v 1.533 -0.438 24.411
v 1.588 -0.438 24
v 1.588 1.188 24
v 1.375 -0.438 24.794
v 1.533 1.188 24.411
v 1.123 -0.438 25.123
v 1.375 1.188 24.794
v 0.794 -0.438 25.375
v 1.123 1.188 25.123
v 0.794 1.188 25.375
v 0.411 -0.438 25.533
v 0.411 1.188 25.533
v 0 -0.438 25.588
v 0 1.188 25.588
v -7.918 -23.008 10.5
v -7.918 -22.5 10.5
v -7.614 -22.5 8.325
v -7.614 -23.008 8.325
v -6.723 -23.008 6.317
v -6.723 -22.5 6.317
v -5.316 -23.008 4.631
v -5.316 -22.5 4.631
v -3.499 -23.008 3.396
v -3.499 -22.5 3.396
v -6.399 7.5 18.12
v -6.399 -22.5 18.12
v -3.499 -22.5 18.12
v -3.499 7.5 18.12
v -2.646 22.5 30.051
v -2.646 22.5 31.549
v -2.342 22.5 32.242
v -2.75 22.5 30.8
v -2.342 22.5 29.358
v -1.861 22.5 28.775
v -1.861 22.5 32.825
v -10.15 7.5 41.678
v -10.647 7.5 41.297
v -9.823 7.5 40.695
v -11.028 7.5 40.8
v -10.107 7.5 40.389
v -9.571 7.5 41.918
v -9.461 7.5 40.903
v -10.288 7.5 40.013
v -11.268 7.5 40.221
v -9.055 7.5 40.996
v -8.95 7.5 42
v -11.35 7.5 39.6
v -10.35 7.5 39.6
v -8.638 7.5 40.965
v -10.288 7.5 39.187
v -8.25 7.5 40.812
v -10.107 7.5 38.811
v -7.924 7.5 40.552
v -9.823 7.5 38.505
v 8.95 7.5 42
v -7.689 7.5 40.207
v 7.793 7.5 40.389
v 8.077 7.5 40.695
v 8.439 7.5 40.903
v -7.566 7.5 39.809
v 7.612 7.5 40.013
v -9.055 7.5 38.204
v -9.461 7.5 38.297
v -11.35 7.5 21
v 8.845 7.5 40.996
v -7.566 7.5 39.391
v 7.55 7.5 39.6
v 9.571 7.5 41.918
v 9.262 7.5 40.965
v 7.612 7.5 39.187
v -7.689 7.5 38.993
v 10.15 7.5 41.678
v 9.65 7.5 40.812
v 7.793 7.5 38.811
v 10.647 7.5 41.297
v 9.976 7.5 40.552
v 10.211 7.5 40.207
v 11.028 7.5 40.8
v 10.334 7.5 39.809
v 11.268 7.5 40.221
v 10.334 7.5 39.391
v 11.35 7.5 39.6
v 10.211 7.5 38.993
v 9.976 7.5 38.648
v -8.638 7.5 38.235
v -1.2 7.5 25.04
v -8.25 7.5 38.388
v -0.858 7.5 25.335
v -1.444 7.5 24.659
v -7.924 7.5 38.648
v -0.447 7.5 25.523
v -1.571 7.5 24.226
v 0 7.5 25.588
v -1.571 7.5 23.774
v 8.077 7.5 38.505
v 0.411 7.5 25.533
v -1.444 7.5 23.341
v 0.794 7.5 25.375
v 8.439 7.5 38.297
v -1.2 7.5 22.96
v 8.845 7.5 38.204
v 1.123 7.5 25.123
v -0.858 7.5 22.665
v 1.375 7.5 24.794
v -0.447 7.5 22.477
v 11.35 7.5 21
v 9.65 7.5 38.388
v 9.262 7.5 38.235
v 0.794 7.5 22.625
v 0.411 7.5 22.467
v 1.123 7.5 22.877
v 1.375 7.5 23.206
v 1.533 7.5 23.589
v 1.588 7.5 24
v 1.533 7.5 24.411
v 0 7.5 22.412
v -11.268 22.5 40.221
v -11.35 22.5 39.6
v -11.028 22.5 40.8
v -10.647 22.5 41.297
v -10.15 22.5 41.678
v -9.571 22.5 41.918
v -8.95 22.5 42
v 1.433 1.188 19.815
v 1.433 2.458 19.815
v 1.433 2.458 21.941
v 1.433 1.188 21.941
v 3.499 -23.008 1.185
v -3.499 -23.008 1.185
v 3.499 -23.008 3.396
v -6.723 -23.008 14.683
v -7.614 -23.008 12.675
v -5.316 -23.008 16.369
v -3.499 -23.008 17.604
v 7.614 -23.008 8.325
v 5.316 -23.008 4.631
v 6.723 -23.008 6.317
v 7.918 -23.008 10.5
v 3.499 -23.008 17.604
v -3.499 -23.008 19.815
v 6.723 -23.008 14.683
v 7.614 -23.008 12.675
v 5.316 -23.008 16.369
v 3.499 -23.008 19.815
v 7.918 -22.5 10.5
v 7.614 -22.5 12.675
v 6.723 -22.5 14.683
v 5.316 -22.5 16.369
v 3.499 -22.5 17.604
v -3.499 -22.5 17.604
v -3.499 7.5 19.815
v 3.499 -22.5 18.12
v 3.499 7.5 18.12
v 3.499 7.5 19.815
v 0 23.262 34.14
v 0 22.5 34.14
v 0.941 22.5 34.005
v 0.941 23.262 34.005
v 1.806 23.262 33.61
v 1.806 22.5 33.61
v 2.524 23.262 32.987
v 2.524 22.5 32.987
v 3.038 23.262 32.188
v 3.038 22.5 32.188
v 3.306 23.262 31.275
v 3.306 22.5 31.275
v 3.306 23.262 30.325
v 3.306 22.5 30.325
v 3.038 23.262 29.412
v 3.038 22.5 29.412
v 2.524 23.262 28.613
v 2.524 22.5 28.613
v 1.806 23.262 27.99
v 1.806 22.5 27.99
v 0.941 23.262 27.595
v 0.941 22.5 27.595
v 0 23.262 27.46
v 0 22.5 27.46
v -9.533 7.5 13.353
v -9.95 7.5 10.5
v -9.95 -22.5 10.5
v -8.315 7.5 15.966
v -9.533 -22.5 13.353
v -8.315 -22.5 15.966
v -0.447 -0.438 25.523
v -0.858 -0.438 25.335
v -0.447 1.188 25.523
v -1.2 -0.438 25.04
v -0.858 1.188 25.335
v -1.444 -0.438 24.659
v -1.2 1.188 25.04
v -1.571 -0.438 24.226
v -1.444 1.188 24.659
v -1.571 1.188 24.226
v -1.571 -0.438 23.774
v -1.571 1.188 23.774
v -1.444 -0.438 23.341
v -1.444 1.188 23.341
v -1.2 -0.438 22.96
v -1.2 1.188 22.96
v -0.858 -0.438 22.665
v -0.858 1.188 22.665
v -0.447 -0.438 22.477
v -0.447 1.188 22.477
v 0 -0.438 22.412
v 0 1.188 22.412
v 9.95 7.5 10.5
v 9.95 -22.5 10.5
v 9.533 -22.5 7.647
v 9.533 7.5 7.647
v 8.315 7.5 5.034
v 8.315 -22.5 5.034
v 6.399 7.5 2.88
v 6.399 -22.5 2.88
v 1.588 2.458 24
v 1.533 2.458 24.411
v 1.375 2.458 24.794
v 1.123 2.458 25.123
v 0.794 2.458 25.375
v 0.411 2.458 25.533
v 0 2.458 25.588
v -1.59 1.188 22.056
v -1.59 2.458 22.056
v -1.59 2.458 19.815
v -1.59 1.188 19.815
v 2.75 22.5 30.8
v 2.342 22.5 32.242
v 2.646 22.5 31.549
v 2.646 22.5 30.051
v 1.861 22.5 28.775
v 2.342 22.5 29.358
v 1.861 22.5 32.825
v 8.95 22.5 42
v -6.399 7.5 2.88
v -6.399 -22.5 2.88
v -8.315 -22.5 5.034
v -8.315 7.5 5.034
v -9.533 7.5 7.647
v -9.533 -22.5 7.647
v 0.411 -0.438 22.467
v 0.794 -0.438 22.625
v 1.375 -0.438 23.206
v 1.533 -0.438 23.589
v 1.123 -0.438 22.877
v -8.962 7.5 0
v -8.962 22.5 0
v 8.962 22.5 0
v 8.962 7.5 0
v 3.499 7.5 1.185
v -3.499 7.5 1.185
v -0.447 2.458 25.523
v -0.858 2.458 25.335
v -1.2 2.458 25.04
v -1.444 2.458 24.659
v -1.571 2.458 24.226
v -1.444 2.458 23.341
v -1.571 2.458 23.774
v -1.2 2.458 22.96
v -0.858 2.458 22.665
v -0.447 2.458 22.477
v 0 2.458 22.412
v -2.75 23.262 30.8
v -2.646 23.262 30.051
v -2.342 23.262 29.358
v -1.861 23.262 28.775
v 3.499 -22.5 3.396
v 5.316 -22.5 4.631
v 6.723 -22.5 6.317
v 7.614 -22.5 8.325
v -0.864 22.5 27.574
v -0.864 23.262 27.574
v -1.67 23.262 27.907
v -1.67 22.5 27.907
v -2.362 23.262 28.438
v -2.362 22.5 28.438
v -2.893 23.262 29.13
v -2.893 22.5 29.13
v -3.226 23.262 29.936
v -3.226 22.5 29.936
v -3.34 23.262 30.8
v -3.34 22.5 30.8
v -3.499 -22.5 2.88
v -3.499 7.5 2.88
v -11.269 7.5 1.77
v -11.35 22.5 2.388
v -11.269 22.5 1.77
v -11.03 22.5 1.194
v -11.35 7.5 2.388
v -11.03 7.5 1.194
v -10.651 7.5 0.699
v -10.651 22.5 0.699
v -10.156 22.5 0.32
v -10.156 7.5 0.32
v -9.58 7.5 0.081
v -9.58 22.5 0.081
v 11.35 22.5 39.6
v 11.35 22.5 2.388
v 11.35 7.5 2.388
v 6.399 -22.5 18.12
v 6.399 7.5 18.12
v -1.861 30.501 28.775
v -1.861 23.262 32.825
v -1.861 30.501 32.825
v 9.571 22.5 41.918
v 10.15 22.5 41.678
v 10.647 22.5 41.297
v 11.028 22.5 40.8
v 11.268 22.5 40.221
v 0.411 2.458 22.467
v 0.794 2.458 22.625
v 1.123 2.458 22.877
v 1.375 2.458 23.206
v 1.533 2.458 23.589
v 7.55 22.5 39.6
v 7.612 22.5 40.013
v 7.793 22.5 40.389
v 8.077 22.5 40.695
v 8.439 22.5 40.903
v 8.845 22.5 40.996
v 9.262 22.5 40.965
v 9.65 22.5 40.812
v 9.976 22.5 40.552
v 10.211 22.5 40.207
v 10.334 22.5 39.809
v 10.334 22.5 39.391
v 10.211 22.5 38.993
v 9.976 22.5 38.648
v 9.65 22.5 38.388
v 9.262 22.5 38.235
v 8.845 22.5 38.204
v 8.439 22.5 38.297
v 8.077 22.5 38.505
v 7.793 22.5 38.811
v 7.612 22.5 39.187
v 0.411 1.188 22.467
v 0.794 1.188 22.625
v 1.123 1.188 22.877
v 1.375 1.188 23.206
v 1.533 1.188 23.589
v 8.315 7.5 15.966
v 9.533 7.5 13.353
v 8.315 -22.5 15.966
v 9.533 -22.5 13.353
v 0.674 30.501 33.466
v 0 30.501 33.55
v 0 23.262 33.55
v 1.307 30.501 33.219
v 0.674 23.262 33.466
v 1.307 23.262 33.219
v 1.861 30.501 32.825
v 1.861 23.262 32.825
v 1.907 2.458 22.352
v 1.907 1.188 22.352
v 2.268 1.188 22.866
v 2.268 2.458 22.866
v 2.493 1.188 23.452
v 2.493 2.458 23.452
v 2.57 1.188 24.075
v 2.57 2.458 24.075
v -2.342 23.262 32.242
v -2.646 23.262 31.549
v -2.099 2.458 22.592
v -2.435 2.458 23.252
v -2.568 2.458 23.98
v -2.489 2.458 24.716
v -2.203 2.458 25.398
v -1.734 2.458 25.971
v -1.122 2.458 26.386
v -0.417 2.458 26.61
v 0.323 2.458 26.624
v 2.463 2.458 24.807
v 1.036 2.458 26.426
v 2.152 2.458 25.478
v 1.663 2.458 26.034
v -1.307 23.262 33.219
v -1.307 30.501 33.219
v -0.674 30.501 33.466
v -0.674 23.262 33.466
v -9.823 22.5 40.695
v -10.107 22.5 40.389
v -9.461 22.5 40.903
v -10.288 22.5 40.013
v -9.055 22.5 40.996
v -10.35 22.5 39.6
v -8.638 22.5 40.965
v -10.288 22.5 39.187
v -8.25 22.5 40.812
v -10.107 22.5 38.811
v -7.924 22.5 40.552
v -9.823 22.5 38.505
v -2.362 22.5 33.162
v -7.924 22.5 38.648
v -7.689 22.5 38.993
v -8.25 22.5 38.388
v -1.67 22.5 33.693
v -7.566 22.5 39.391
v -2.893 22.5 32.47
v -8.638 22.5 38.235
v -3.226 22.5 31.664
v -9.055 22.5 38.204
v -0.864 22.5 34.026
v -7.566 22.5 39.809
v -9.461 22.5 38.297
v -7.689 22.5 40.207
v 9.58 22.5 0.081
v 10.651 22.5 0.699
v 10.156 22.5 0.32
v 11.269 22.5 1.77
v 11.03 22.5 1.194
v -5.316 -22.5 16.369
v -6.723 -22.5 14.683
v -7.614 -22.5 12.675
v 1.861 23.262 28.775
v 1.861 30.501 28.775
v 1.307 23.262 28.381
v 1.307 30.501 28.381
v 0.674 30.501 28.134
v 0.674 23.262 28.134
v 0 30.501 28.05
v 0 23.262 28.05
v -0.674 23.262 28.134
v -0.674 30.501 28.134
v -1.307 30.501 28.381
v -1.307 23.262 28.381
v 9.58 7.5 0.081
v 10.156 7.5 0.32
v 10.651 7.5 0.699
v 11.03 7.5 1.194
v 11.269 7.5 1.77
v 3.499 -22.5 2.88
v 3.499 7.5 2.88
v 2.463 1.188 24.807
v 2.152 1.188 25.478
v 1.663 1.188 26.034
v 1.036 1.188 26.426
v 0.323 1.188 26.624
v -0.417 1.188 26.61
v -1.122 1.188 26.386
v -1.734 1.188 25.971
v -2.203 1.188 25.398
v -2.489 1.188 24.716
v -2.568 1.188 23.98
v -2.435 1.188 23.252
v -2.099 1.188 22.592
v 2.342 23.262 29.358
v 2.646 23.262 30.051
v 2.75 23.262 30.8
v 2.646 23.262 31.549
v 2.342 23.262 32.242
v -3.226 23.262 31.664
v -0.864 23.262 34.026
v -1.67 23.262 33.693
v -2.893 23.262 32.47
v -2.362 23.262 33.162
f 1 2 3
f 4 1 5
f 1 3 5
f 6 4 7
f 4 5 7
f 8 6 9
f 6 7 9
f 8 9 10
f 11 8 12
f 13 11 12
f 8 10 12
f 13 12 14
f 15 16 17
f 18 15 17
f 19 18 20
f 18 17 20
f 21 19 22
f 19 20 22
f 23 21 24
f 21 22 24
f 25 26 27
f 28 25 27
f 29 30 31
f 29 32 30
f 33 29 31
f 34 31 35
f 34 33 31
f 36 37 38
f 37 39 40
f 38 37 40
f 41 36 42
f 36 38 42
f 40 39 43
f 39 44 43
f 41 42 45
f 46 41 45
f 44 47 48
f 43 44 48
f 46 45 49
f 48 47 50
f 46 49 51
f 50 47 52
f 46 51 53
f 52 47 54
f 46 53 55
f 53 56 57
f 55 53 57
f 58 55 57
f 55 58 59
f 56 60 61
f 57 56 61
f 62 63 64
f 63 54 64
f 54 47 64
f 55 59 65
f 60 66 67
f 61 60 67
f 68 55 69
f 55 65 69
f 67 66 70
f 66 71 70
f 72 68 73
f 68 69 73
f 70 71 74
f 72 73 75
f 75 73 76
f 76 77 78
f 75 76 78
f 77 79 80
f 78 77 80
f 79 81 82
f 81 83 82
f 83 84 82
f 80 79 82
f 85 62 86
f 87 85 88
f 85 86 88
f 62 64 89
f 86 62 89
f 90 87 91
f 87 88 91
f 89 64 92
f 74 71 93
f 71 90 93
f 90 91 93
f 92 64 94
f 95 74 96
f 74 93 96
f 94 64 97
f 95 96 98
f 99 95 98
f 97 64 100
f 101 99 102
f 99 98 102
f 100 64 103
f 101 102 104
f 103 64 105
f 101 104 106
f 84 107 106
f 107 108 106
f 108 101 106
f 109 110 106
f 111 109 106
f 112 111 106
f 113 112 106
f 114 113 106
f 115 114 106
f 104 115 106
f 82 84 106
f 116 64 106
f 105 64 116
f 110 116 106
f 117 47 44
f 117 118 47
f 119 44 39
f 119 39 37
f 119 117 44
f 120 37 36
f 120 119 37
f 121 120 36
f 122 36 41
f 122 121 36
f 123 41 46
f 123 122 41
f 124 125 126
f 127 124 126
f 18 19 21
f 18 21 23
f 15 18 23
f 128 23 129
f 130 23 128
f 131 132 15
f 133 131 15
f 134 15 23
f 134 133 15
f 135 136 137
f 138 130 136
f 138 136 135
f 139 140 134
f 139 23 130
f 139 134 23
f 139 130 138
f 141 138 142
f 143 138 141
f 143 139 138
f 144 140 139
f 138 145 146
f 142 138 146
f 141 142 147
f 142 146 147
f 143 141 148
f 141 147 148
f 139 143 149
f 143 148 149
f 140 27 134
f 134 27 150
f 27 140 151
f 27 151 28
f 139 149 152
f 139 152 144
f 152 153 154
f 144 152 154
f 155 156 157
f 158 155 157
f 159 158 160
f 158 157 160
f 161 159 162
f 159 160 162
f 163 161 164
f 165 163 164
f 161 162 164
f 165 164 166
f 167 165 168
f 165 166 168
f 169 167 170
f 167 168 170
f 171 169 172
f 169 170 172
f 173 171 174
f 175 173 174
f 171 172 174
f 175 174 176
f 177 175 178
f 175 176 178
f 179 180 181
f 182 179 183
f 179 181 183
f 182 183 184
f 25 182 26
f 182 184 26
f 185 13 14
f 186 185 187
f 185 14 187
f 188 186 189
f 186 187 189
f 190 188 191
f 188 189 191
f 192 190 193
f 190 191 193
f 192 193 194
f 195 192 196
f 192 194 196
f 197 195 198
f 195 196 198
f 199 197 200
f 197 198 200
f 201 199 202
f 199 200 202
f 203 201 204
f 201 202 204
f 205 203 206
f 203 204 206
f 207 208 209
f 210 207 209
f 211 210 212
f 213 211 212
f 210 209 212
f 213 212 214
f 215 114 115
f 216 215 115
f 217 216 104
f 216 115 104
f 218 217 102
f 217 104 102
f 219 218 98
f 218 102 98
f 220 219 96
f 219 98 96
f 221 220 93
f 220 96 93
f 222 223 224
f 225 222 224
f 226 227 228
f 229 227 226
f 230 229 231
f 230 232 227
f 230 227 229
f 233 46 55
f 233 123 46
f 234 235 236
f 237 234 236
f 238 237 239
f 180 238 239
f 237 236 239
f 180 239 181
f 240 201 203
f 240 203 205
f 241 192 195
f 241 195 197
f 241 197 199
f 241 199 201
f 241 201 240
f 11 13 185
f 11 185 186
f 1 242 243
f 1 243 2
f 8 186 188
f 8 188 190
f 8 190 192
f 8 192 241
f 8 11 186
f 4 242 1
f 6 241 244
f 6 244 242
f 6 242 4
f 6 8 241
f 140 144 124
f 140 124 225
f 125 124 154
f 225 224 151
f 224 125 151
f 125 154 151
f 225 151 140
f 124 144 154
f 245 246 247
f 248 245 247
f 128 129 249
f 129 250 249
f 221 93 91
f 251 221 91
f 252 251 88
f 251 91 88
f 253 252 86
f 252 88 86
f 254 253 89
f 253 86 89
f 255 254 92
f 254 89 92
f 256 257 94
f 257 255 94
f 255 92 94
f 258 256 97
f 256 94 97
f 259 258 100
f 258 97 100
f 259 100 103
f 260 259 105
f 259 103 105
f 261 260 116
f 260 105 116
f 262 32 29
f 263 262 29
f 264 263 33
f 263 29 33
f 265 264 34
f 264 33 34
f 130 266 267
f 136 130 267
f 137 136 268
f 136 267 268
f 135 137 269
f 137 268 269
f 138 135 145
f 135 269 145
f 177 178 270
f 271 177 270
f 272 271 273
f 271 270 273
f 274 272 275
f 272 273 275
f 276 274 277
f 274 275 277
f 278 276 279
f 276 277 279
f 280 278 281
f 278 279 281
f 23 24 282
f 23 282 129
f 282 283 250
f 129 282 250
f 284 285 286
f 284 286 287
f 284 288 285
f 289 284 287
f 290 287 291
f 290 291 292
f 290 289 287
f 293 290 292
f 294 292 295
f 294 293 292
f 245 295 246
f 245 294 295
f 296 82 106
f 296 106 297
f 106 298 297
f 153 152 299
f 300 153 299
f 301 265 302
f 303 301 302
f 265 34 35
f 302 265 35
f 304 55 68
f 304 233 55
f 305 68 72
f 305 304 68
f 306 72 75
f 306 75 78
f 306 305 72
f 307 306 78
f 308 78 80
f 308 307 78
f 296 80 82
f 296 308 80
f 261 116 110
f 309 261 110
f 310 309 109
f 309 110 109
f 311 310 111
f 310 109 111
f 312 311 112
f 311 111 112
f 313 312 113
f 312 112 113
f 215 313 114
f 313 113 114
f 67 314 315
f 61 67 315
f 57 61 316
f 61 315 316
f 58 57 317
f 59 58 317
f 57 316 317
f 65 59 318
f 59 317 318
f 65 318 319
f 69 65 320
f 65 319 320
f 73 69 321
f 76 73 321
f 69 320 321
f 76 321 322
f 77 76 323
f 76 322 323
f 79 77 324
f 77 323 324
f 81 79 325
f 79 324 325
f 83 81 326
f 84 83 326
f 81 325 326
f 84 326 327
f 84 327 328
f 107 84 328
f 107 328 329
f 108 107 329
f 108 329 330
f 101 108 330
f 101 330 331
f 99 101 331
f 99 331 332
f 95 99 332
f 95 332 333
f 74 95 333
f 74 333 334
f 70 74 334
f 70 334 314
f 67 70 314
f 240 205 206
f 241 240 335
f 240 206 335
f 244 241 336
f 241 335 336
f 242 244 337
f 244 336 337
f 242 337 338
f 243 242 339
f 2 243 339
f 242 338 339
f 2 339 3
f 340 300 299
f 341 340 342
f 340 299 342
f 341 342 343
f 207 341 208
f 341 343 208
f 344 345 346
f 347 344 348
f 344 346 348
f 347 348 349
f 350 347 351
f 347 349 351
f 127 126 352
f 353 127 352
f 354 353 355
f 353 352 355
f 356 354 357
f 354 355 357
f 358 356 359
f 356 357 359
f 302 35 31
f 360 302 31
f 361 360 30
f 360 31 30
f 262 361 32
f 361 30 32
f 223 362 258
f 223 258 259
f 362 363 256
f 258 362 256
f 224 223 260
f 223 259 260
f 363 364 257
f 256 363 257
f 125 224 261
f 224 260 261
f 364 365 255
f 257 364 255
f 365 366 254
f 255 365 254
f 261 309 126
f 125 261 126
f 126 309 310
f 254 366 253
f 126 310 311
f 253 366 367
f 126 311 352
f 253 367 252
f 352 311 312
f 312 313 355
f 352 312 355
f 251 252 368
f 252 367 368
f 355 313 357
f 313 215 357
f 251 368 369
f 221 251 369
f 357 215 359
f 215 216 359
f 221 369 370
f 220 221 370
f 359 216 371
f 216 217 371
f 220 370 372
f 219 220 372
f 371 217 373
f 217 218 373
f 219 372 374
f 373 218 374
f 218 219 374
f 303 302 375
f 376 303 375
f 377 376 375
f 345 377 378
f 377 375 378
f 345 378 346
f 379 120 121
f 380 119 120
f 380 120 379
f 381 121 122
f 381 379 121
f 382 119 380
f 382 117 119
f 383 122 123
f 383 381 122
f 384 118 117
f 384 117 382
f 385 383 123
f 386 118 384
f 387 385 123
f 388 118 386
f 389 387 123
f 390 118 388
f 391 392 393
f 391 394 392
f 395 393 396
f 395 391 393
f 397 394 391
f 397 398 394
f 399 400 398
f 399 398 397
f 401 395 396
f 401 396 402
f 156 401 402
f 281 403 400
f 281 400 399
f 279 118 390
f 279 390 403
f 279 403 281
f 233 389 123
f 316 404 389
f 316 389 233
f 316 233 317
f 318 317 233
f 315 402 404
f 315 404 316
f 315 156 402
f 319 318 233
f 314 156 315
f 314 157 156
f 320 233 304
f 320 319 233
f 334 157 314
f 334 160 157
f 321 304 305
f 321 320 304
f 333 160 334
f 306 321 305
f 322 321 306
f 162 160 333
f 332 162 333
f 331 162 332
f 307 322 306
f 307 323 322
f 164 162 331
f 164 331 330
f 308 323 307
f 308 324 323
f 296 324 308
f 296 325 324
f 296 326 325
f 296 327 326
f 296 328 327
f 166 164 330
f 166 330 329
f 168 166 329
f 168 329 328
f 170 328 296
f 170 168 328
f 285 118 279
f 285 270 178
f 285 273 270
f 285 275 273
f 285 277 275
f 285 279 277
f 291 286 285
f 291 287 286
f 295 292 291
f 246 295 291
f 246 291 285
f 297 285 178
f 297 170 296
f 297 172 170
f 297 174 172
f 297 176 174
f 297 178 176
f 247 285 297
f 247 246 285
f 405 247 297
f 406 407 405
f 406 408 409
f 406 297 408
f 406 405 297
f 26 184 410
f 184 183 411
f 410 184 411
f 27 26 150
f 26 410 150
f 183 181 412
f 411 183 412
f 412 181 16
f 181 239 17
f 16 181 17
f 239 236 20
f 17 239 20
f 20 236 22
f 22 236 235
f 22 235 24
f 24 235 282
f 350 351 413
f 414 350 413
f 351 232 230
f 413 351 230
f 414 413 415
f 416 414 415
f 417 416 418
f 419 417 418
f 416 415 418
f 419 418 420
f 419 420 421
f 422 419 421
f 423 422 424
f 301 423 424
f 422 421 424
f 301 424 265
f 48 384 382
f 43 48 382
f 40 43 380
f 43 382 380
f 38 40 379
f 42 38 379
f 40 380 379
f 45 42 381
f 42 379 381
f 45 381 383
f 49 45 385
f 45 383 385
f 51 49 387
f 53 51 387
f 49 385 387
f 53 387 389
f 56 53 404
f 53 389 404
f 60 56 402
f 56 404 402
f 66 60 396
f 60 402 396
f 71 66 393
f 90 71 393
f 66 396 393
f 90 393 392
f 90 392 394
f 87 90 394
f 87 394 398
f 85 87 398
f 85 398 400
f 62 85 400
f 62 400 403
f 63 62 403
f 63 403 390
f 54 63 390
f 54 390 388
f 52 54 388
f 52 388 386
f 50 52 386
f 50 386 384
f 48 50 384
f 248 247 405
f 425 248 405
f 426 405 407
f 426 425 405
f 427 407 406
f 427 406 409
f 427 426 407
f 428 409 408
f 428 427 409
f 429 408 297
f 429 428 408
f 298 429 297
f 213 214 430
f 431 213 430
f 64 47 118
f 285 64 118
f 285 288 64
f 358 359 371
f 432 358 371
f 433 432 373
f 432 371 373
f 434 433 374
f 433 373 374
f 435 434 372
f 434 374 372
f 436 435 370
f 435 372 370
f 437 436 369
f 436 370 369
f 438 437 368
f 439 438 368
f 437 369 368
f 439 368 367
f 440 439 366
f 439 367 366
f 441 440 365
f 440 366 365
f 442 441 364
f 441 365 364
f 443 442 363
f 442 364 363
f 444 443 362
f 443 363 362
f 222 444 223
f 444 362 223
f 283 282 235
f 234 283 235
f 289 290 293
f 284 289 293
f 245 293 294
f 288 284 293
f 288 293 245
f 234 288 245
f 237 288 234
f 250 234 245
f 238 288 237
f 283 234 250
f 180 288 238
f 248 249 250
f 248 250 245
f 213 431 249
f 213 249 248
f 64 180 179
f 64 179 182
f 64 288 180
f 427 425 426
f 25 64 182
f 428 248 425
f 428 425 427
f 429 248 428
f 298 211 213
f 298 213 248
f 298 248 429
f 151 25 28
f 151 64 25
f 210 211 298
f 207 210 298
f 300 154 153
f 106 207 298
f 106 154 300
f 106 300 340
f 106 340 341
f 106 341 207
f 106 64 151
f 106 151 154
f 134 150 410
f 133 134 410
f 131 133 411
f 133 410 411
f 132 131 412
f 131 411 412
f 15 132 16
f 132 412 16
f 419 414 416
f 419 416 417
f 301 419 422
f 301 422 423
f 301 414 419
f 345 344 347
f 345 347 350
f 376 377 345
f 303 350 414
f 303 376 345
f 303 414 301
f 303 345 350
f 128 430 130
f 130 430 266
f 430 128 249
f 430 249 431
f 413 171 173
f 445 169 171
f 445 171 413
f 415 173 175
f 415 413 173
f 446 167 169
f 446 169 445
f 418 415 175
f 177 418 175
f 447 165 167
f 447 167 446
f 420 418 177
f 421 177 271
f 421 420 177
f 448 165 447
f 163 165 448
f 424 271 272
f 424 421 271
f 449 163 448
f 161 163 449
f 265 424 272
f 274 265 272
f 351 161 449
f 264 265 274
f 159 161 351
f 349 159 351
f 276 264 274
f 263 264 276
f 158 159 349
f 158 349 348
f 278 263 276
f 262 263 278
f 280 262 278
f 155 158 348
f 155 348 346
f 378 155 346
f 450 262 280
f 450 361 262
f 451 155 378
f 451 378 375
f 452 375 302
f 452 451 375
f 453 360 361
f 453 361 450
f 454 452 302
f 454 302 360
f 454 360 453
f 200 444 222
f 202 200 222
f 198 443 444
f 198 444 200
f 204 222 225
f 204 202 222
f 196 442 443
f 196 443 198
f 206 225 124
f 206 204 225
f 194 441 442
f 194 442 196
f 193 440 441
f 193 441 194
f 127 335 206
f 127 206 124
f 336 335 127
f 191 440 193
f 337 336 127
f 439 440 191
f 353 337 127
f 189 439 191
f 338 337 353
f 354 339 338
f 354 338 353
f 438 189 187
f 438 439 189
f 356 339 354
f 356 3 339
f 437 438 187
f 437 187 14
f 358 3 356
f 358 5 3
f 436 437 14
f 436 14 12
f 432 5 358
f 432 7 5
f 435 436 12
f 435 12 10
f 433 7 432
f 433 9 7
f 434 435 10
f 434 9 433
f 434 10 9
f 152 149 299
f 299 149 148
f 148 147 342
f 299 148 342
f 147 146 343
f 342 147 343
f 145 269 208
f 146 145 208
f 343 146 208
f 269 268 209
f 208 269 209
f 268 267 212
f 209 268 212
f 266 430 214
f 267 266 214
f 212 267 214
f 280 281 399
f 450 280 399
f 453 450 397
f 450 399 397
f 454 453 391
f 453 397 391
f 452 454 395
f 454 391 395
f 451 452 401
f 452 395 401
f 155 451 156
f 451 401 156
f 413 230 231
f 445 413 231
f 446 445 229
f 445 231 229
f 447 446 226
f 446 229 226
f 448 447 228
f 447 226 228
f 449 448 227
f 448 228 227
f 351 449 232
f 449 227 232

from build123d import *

# Parameters (mm, degrees)
F0_W      = 22.7
F0_H      = 15
F1_DEPTH  = 42
F0_H_2    = 30
F2_DEPTH  = 21
F4_DEPTH  = 7.9375
F5_R      = 2.4
F8_DEPTH  = 29.99994
F11_DEPTH = 1.27
F12_R     = 2.3876
F13_DEPTH = 8.001
F14_DEPTH = 0.762
F6_R      = 1.4
F15_DEPTH = 25.4
F16_DEPTH = 0.508


# Not quite as in the source:
# - a length typed as a fraction of an inch, garbled in the dataset ("3 / 203.2 mm" for 3/8 in), is restored


with BuildPart() as f1:
    # F0 (on Top) → F1 (new body)
    with BuildSketch(Plane.XY):
        with Locations((0, 15)):
            Rectangle(F0_W, F0_H)
    extrude(amount=F1_DEPTH)

    # F0 (on Top) → F2 (join)
    with BuildSketch(Plane.XY):
        with Locations((0, 15)):
            Rectangle(F0_W, F0_H)
        with Locations((0, -7.5)):
            Rectangle(F0_W, F0_H_2)
    extrude(amount=F2_DEPTH)

    # F3 (on face) → F4 (join)
    with BuildSketch(Plane.XZ.offset(-7.5)):
        with BuildLine():
            Line((0, 25.5875), (0, 22.4125))
            ThreePointArc((0, 22.4125), (1.1225320151, 22.8774679849), (1.5875, 24))
            ThreePointArc((1.5875, 24), (1.1225320151, 25.1225320151), (0, 25.5875))
        make_face()
        with BuildLine():
            ThreePointArc((0, 25.5875), (-1.5875, 24), (0, 22.4125))
            Line((0, 22.4125), (0, 25.5875))
        make_face()
    extrude(amount=F4_DEPTH)

    # F5
    f5_edges = [f1.edges().sort_by_distance(p)[0] for p in [
        (-11.35, 15, 42),
        (11.35, 15, 42),
    ]]
    fillet(f5_edges, radius=F5_R)

    # F7 (on face) → F8 (cut)
    with BuildSketch(Plane.XZ.offset(22.5)):
        with BuildLine():
            Line((11.35, 21), (0, 21))
            Line((0, 21), (0, 20.45045))
            ThreePointArc((0, 20.45045), (1.7780416897, 20.2903024954), (3.49885, 19.8150149694))
            ThreePointArc((3.49885, 19.8150149694), (5.0209631758, 19.0907731893), (6.3989886078, 18.12))
            ThreePointArc((6.3989886078, 18.12), (9.0189875095, 14.7034889681), (9.95045, 10.5))
            Line((9.95045, 10.5), (11.35, 10.5))
            Line((11.35, 10.5), (11.35, 21))
        make_face()
        with BuildLine():
            Line((0, 20.45045), (0, 21))
            Line((0, 21), (-11.35, 21))
            Line((-11.35, 21), (-11.35, 10.5))
            Line((-11.35, 10.5), (-9.95045, 10.5))
            ThreePointArc((-9.95045, 10.5), (-9.0189875095, 14.7034889681), (-6.3989886078, 18.12))
            ThreePointArc((-6.3989886078, 18.12), (-5.0209631758, 19.0907731893), (-3.49885, 19.8150149694))
            ThreePointArc((-3.49885, 19.8150149694), (-1.7780416897, 20.2903024954), (0, 20.45045))
        make_face()
        with BuildLine():
            Line((-3.49885, 18.12), (-3.49885, 19.8150149694))
            ThreePointArc((-3.49885, 19.8150149694), (-5.0209631758, 19.0907731893), (-6.3989886078, 18.12))
            Line((-6.3989886078, 18.12), (-3.49885, 18.12))
        make_face()
        with BuildLine():
            ThreePointArc((6.3989886078, 18.12), (5.0209631758, 19.0907731893), (3.49885, 19.8150149694))
            Line((3.49885, 19.8150149694), (3.49885, 18.12))
            Line((3.49885, 18.12), (6.3989886078, 18.12))
        make_face()
        with BuildLine():
            Line((-9.95045, 10.5), (-11.35, 10.5))
            Line((-11.35, 10.5), (-11.35, 0))
            Line((-11.35, 0), (0, 0))
            Line((0, 0), (0, 0.54955))
            ThreePointArc((0, 0.54955), (-1.7780416897, 0.7096975046), (-3.49885, 1.1849850306))
            ThreePointArc((-3.49885, 1.1849850306), (-5.0209631758, 1.9092268107), (-6.3989886078, 2.88))
            ThreePointArc((-6.3989886078, 2.88), (-9.0189875095, 6.2965110319), (-9.95045, 10.5))
        make_face()
        with BuildLine():
            Line((11.35, 0), (11.35, 10.5))
            Line((11.35, 10.5), (9.95045, 10.5))
            ThreePointArc((9.95045, 10.5), (9.0189875095, 6.2965110319), (6.3989886078, 2.88))
            ThreePointArc((6.3989886078, 2.88), (5.0209631758, 1.9092268107), (3.49885, 1.1849850306))
            ThreePointArc((3.49885, 1.1849850306), (1.7780416897, 0.7096975046), (0, 0.54955))
            Line((0, 0.54955), (0, 0))
            Line((0, 0), (11.35, 0))
        make_face()
        with BuildLine():
            ThreePointArc((3.49885, 1.1849850306), (5.0209631758, 1.9092268107), (6.3989886078, 2.88))
            Line((6.3989886078, 2.88), (3.49885, 2.88))
            Line((3.49885, 2.88), (3.49885, 1.1849850306))
        make_face()
        with BuildLine():
            Line((-3.49885, 2.88), (-6.3989886078, 2.88))
            ThreePointArc((-6.3989886078, 2.88), (-5.0209631758, 1.9092268107), (-3.49885, 1.1849850306))
            Line((-3.49885, 1.1849850306), (-3.49885, 2.88))
        make_face()
        with BuildLine():
            ThreePointArc((3.49885, 19.8150149694), (1.7780416897, 20.2903024954), (0, 20.45045))
            Line((0, 20.45045), (0, 19.8150149694))
            Line((0, 19.8150149694), (3.49885, 19.8150149694))
        make_face()
        with BuildLine():
            Line((0, 19.8150149694), (0, 20.45045))
            ThreePointArc((0, 20.45045), (-1.7780416897, 20.2903024954), (-3.49885, 19.8150149694))
            Line((-3.49885, 19.8150149694), (0, 19.8150149694))
        make_face()
        with BuildLine():
            ThreePointArc((0, 0.54955), (1.7780416897, 0.7096975046), (3.49885, 1.1849850306))
            Line((3.49885, 1.1849850306), (0, 1.1849850306))
            Line((0, 1.1849850306), (0, 0.54955))
        make_face()
        with BuildLine():
            ThreePointArc((-3.49885, 1.1849850306), (-1.7780416897, 0.7096975046), (0, 0.54955))
            Line((0, 0.54955), (0, 1.1849850306))
            Line((0, 1.1849850306), (-3.49885, 1.1849850306))
        make_face()
    extrude(amount=-F8_DEPTH, mode=Mode.SUBTRACT)

    # F10 (on offset) → F11 (join)
    with BuildSketch(Plane.XZ.offset(-2.4581)):
        with BuildLine():
            ThreePointArc((1.4326738892, 21.9412771473), (2.2677347419, 22.8658808954), (2.5697519674, 24.0746010095))
            ThreePointArc((2.5697519674, 24.0746010095), (-1.1220643914, 26.3864393852), (-1.5898686834, 22.0557045923))
            Line((-1.5898686834, 22.0557045923), (-1.5898686834, 23.8072182983))
            Line((-1.5898686834, 23.8072182983), (1.4326738892, 23.8072182983))
            Line((1.4326738892, 23.8072182983), (1.4326738892, 21.9412771473))
        make_face()
        with BuildLine():
            Line((-1.5898686834, 23.8072182983), (-1.5898686834, 22.0557045923))
            ThreePointArc((-1.5898686834, 22.0557045923), (-0.0972160525, 21.5066885864), (1.4326738892, 21.9412771473))
            Line((1.4326738892, 21.9412771473), (1.4326738892, 23.8072182983))
            Line((1.4326738892, 23.8072182983), (-1.5898686834, 23.8072182983))
        make_face()
        with BuildLine():
            ThreePointArc((1.4326738892, 21.9412771473), (-0.0972160525, 21.5066885864), (-1.5898686834, 22.0557045923))
            Line((-1.5898686834, 22.0557045923), (-1.5898686834, 19.2958321422))
            Line((-1.5898686834, 19.2958321422), (1.4326738892, 19.2958321422))
            Line((1.4326738892, 19.2958321422), (1.4326738892, 21.9412771473))
        make_face()
    extrude(amount=F11_DEPTH)

    # F12
    f12_edges = [f1.edges().sort_by_distance(p)[0] for p in [
        (11.35, 14.99997, 0),
        (-11.35, 14.99997, 0),
    ]]
    fillet(f12_edges, radius=F12_R)

    # F6 (on face) → F13 (join)
    with BuildSketch(Plane(origin=(0, 22.5, 0), x_dir=(-1, 0, 0), z_dir=(0, 1, 0))):
        with BuildLine():
            ThreePointArc((1.86055, 32.8250564677), (0.9983973943, 33.3623627072), (0, 33.55))
            Line((0, 33.55), (0, 28.05))
            ThreePointArc((0, 28.05), (0.9983973943, 28.2376372928), (1.86055, 28.7749435323))
            Line((1.86055, 28.7749435323), (1.86055, 32.8250564677))
        make_face()
        with BuildLine():
            Line((0, 28.05), (0, 33.55))
            ThreePointArc((0, 33.55), (-0.9983973943, 33.3623627072), (-1.86055, 32.8250564677))
            Line((-1.86055, 32.8250564677), (-1.86055, 28.7749435323))
            ThreePointArc((-1.86055, 28.7749435323), (-0.9983973943, 28.2376372928), (0, 28.05))
        make_face()
    extrude(amount=F13_DEPTH)

    # F6 (on face) → F14 (join)
    with BuildSketch(Plane(origin=(0, 22.5, 0), x_dir=(-1, 0, 0), z_dir=(0, 1, 0))):
        with BuildLine():
            ThreePointArc((3.3400836906, 30.8), (2.3617958273, 33.1617958273), (0, 34.1400836906))
            Line((0, 34.1400836906), (0, 33.55))
            ThreePointArc((0, 33.55), (0.9983973943, 33.3623627072), (1.86055, 32.8250564677))
            ThreePointArc((1.86055, 32.8250564677), (2.5178376139, 31.9058904783), (2.75, 30.8))
            ThreePointArc((2.75, 30.8), (2.5178376139, 29.6941095217), (1.86055, 28.7749435323))
            ThreePointArc((1.86055, 28.7749435323), (0.9983973943, 28.2376372928), (0, 28.05))
            Line((0, 28.05), (0, 27.4599163094))
            ThreePointArc((0, 27.4599163094), (2.3617958273, 28.4382041727), (3.3400836906, 30.8))
        make_face()
        with BuildLine():
            Line((0, 33.55), (0, 34.1400836906))
            ThreePointArc((0, 34.1400836906), (-3.3400836906, 30.8), (0, 27.4599163094))
            Line((0, 27.4599163094), (0, 28.05))
            ThreePointArc((0, 28.05), (-0.9983973943, 28.2376372928), (-1.86055, 28.7749435323))
            ThreePointArc((-1.86055, 28.7749435323), (-2.75, 30.8), (-1.86055, 32.8250564677))
            ThreePointArc((-1.86055, 32.8250564677), (-0.9983973943, 33.3623627072), (0, 33.55))
        make_face()
    extrude(amount=F14_DEPTH)

    # F6 (on face) → F15 (cut)
    with BuildSketch(Plane(origin=(0, 22.5, 0), x_dir=(-1, 0, 0), z_dir=(0, 1, 0))):
        with Locations((-8.95, 39.6)):
            Circle(F6_R)
        with Locations((8.95, 39.6)):
            Circle(F6_R)
    extrude(amount=-F15_DEPTH, mode=Mode.SUBTRACT)

    # F7 (on face) → F16 (join)
    with BuildSketch(Plane.XZ.offset(22.5)):
        with BuildLine():
            ThreePointArc((7.91845, 10.5), (6.7233666859, 14.6830838875), (3.49885, 17.6035131505))
            Line((3.49885, 17.6035131505), (3.49885, 10.5))
            Line((3.49885, 10.5), (7.91845, 10.5))
        make_face()
        with BuildLine():
            Line((2.1534740311, 18.12), (0, 18.12))
            Line((0, 18.12), (0, 10.5))
            Line((0, 10.5), (3.49885, 10.5))
            Line((3.49885, 10.5), (3.49885, 17.6035131505))
            ThreePointArc((3.49885, 17.6035131505), (2.8379361171, 17.8924264621), (2.1534740311, 18.12))
        make_face()
        with BuildLine():
            Line((0, 10.5), (0, 18.12))
            Line((0, 18.12), (-2.1534740311, 18.12))
            ThreePointArc((-2.1534740311, 18.12), (-2.8379361171, 17.8924264621), (-3.49885, 17.6035131505))
            Line((-3.49885, 17.6035131505), (-3.49885, 10.5))
            Line((-3.49885, 10.5), (0, 10.5))
        make_face()
        with BuildLine():
            Line((-3.49885, 10.5), (-3.49885, 17.6035131505))
            ThreePointArc((-3.49885, 17.6035131505), (-6.7233666859, 14.6830838875), (-7.91845, 10.5))
            Line((-7.91845, 10.5), (-3.49885, 10.5))
        make_face()
        with BuildLine():
            Line((-3.49885, 10.5), (-7.91845, 10.5))
            ThreePointArc((-7.91845, 10.5), (-6.7233666859, 6.3169161125), (-3.49885, 3.3964868495))
            Line((-3.49885, 3.3964868495), (-3.49885, 10.5))
        make_face()
        with BuildLine():
            Line((0, 2.88), (0, 10.5))
            Line((0, 10.5), (-3.49885, 10.5))
            Line((-3.49885, 10.5), (-3.49885, 3.3964868495))
            ThreePointArc((-3.49885, 3.3964868495), (-2.8379361171, 3.1075735379), (-2.1534740311, 2.88))
            Line((-2.1534740311, 2.88), (0, 2.88))
        make_face()
        with BuildLine():
            Line((3.49885, 10.5), (0, 10.5))
            Line((0, 10.5), (0, 2.88))
            Line((0, 2.88), (2.1534740311, 2.88))
            ThreePointArc((2.1534740311, 2.88), (2.8379361171, 3.1075735379), (3.49885, 3.3964868495))
            Line((3.49885, 3.3964868495), (3.49885, 10.5))
        make_face()
        with BuildLine():
            ThreePointArc((3.49885, 3.3964868495), (6.7233666859, 6.3169161125), (7.91845, 10.5))
            Line((7.91845, 10.5), (3.49885, 10.5))
            Line((3.49885, 10.5), (3.49885, 3.3964868495))
        make_face()
        with BuildLine():
            ThreePointArc((2.1534740311, 18.12), (1.0870283811, 18.3434826258), (0, 18.41845))
            Line((0, 18.41845), (0, 18.12))
            Line((0, 18.12), (2.1534740311, 18.12))
        make_face()
        with BuildLine():
            Line((0, 18.12), (0, 18.41845))
            ThreePointArc((0, 18.41845), (-1.0870283811, 18.3434826258), (-2.1534740311, 18.12))
            Line((-2.1534740311, 18.12), (0, 18.12))
        make_face()
        with BuildLine():
            Line((2.1534740311, 2.88), (0, 2.88))
            Line((0, 2.88), (0, 2.58155))
            ThreePointArc((0, 2.58155), (1.0870283811, 2.6565173742), (2.1534740311, 2.88))
        make_face()
        with BuildLine():
            Line((0, 2.58155), (0, 2.88))
            Line((0, 2.88), (-2.1534740311, 2.88))
            ThreePointArc((-2.1534740311, 2.88), (-1.0870283811, 2.6565173742), (0, 2.58155))
        make_face()
        with BuildLine():
            Line((3.49885, 19.8150149694), (0, 19.8150149694))
            Line((0, 19.8150149694), (0, 18.41845))
            ThreePointArc((0, 18.41845), (1.0870283811, 18.3434826258), (2.1534740311, 18.12))
            Line((2.1534740311, 18.12), (3.49885, 18.12))
            Line((3.49885, 18.12), (3.49885, 19.8150149694))
        make_face()
        with BuildLine():
            Line((0, 18.41845), (0, 19.8150149694))
            Line((0, 19.8150149694), (-3.49885, 19.8150149694))
            Line((-3.49885, 19.8150149694), (-3.49885, 18.12))
            Line((-3.49885, 18.12), (-2.1534740311, 18.12))
            ThreePointArc((-2.1534740311, 18.12), (-1.0870283811, 18.3434826258), (0, 18.41845))
        make_face()
        with BuildLine():
            Line((-2.1534740311, 18.12), (-3.49885, 18.12))
            Line((-3.49885, 18.12), (-3.49885, 17.6035131505))
            ThreePointArc((-3.49885, 17.6035131505), (-2.8379361171, 17.8924264621), (-2.1534740311, 18.12))
        make_face()
        with BuildLine():
            Line((3.49885, 17.6035131505), (3.49885, 18.12))
            Line((3.49885, 18.12), (2.1534740311, 18.12))
            ThreePointArc((2.1534740311, 18.12), (2.8379361171, 17.8924264621), (3.49885, 17.6035131505))
        make_face()
        with BuildLine():
            Line((0, 1.1849850306), (3.49885, 1.1849850306))
            Line((3.49885, 1.1849850306), (3.49885, 2.88))
            Line((3.49885, 2.88), (2.1534740311, 2.88))
            ThreePointArc((2.1534740311, 2.88), (1.0870283811, 2.6565173742), (0, 2.58155))
            Line((0, 2.58155), (0, 1.1849850306))
        make_face()
        with BuildLine():
            Line((-3.49885, 2.88), (-3.49885, 1.1849850306))
            Line((-3.49885, 1.1849850306), (0, 1.1849850306))
            Line((0, 1.1849850306), (0, 2.58155))
            ThreePointArc((0, 2.58155), (-1.0870283811, 2.6565173742), (-2.1534740311, 2.88))
            Line((-2.1534740311, 2.88), (-3.49885, 2.88))
        make_face()
        with BuildLine():
            ThreePointArc((-2.1534740311, 2.88), (-2.8379361171, 3.1075735379), (-3.49885, 3.3964868495))
            Line((-3.49885, 3.3964868495), (-3.49885, 2.88))
            Line((-3.49885, 2.88), (-2.1534740311, 2.88))
        make_face()
        with BuildLine():
            Line((3.49885, 2.88), (3.49885, 3.3964868495))
            ThreePointArc((3.49885, 3.3964868495), (2.8379361171, 3.1075735379), (2.1534740311, 2.88))
            Line((2.1534740311, 2.88), (3.49885, 2.88))
        make_face()
    extrude(amount=F16_DEPTH)


solid = f1.part
